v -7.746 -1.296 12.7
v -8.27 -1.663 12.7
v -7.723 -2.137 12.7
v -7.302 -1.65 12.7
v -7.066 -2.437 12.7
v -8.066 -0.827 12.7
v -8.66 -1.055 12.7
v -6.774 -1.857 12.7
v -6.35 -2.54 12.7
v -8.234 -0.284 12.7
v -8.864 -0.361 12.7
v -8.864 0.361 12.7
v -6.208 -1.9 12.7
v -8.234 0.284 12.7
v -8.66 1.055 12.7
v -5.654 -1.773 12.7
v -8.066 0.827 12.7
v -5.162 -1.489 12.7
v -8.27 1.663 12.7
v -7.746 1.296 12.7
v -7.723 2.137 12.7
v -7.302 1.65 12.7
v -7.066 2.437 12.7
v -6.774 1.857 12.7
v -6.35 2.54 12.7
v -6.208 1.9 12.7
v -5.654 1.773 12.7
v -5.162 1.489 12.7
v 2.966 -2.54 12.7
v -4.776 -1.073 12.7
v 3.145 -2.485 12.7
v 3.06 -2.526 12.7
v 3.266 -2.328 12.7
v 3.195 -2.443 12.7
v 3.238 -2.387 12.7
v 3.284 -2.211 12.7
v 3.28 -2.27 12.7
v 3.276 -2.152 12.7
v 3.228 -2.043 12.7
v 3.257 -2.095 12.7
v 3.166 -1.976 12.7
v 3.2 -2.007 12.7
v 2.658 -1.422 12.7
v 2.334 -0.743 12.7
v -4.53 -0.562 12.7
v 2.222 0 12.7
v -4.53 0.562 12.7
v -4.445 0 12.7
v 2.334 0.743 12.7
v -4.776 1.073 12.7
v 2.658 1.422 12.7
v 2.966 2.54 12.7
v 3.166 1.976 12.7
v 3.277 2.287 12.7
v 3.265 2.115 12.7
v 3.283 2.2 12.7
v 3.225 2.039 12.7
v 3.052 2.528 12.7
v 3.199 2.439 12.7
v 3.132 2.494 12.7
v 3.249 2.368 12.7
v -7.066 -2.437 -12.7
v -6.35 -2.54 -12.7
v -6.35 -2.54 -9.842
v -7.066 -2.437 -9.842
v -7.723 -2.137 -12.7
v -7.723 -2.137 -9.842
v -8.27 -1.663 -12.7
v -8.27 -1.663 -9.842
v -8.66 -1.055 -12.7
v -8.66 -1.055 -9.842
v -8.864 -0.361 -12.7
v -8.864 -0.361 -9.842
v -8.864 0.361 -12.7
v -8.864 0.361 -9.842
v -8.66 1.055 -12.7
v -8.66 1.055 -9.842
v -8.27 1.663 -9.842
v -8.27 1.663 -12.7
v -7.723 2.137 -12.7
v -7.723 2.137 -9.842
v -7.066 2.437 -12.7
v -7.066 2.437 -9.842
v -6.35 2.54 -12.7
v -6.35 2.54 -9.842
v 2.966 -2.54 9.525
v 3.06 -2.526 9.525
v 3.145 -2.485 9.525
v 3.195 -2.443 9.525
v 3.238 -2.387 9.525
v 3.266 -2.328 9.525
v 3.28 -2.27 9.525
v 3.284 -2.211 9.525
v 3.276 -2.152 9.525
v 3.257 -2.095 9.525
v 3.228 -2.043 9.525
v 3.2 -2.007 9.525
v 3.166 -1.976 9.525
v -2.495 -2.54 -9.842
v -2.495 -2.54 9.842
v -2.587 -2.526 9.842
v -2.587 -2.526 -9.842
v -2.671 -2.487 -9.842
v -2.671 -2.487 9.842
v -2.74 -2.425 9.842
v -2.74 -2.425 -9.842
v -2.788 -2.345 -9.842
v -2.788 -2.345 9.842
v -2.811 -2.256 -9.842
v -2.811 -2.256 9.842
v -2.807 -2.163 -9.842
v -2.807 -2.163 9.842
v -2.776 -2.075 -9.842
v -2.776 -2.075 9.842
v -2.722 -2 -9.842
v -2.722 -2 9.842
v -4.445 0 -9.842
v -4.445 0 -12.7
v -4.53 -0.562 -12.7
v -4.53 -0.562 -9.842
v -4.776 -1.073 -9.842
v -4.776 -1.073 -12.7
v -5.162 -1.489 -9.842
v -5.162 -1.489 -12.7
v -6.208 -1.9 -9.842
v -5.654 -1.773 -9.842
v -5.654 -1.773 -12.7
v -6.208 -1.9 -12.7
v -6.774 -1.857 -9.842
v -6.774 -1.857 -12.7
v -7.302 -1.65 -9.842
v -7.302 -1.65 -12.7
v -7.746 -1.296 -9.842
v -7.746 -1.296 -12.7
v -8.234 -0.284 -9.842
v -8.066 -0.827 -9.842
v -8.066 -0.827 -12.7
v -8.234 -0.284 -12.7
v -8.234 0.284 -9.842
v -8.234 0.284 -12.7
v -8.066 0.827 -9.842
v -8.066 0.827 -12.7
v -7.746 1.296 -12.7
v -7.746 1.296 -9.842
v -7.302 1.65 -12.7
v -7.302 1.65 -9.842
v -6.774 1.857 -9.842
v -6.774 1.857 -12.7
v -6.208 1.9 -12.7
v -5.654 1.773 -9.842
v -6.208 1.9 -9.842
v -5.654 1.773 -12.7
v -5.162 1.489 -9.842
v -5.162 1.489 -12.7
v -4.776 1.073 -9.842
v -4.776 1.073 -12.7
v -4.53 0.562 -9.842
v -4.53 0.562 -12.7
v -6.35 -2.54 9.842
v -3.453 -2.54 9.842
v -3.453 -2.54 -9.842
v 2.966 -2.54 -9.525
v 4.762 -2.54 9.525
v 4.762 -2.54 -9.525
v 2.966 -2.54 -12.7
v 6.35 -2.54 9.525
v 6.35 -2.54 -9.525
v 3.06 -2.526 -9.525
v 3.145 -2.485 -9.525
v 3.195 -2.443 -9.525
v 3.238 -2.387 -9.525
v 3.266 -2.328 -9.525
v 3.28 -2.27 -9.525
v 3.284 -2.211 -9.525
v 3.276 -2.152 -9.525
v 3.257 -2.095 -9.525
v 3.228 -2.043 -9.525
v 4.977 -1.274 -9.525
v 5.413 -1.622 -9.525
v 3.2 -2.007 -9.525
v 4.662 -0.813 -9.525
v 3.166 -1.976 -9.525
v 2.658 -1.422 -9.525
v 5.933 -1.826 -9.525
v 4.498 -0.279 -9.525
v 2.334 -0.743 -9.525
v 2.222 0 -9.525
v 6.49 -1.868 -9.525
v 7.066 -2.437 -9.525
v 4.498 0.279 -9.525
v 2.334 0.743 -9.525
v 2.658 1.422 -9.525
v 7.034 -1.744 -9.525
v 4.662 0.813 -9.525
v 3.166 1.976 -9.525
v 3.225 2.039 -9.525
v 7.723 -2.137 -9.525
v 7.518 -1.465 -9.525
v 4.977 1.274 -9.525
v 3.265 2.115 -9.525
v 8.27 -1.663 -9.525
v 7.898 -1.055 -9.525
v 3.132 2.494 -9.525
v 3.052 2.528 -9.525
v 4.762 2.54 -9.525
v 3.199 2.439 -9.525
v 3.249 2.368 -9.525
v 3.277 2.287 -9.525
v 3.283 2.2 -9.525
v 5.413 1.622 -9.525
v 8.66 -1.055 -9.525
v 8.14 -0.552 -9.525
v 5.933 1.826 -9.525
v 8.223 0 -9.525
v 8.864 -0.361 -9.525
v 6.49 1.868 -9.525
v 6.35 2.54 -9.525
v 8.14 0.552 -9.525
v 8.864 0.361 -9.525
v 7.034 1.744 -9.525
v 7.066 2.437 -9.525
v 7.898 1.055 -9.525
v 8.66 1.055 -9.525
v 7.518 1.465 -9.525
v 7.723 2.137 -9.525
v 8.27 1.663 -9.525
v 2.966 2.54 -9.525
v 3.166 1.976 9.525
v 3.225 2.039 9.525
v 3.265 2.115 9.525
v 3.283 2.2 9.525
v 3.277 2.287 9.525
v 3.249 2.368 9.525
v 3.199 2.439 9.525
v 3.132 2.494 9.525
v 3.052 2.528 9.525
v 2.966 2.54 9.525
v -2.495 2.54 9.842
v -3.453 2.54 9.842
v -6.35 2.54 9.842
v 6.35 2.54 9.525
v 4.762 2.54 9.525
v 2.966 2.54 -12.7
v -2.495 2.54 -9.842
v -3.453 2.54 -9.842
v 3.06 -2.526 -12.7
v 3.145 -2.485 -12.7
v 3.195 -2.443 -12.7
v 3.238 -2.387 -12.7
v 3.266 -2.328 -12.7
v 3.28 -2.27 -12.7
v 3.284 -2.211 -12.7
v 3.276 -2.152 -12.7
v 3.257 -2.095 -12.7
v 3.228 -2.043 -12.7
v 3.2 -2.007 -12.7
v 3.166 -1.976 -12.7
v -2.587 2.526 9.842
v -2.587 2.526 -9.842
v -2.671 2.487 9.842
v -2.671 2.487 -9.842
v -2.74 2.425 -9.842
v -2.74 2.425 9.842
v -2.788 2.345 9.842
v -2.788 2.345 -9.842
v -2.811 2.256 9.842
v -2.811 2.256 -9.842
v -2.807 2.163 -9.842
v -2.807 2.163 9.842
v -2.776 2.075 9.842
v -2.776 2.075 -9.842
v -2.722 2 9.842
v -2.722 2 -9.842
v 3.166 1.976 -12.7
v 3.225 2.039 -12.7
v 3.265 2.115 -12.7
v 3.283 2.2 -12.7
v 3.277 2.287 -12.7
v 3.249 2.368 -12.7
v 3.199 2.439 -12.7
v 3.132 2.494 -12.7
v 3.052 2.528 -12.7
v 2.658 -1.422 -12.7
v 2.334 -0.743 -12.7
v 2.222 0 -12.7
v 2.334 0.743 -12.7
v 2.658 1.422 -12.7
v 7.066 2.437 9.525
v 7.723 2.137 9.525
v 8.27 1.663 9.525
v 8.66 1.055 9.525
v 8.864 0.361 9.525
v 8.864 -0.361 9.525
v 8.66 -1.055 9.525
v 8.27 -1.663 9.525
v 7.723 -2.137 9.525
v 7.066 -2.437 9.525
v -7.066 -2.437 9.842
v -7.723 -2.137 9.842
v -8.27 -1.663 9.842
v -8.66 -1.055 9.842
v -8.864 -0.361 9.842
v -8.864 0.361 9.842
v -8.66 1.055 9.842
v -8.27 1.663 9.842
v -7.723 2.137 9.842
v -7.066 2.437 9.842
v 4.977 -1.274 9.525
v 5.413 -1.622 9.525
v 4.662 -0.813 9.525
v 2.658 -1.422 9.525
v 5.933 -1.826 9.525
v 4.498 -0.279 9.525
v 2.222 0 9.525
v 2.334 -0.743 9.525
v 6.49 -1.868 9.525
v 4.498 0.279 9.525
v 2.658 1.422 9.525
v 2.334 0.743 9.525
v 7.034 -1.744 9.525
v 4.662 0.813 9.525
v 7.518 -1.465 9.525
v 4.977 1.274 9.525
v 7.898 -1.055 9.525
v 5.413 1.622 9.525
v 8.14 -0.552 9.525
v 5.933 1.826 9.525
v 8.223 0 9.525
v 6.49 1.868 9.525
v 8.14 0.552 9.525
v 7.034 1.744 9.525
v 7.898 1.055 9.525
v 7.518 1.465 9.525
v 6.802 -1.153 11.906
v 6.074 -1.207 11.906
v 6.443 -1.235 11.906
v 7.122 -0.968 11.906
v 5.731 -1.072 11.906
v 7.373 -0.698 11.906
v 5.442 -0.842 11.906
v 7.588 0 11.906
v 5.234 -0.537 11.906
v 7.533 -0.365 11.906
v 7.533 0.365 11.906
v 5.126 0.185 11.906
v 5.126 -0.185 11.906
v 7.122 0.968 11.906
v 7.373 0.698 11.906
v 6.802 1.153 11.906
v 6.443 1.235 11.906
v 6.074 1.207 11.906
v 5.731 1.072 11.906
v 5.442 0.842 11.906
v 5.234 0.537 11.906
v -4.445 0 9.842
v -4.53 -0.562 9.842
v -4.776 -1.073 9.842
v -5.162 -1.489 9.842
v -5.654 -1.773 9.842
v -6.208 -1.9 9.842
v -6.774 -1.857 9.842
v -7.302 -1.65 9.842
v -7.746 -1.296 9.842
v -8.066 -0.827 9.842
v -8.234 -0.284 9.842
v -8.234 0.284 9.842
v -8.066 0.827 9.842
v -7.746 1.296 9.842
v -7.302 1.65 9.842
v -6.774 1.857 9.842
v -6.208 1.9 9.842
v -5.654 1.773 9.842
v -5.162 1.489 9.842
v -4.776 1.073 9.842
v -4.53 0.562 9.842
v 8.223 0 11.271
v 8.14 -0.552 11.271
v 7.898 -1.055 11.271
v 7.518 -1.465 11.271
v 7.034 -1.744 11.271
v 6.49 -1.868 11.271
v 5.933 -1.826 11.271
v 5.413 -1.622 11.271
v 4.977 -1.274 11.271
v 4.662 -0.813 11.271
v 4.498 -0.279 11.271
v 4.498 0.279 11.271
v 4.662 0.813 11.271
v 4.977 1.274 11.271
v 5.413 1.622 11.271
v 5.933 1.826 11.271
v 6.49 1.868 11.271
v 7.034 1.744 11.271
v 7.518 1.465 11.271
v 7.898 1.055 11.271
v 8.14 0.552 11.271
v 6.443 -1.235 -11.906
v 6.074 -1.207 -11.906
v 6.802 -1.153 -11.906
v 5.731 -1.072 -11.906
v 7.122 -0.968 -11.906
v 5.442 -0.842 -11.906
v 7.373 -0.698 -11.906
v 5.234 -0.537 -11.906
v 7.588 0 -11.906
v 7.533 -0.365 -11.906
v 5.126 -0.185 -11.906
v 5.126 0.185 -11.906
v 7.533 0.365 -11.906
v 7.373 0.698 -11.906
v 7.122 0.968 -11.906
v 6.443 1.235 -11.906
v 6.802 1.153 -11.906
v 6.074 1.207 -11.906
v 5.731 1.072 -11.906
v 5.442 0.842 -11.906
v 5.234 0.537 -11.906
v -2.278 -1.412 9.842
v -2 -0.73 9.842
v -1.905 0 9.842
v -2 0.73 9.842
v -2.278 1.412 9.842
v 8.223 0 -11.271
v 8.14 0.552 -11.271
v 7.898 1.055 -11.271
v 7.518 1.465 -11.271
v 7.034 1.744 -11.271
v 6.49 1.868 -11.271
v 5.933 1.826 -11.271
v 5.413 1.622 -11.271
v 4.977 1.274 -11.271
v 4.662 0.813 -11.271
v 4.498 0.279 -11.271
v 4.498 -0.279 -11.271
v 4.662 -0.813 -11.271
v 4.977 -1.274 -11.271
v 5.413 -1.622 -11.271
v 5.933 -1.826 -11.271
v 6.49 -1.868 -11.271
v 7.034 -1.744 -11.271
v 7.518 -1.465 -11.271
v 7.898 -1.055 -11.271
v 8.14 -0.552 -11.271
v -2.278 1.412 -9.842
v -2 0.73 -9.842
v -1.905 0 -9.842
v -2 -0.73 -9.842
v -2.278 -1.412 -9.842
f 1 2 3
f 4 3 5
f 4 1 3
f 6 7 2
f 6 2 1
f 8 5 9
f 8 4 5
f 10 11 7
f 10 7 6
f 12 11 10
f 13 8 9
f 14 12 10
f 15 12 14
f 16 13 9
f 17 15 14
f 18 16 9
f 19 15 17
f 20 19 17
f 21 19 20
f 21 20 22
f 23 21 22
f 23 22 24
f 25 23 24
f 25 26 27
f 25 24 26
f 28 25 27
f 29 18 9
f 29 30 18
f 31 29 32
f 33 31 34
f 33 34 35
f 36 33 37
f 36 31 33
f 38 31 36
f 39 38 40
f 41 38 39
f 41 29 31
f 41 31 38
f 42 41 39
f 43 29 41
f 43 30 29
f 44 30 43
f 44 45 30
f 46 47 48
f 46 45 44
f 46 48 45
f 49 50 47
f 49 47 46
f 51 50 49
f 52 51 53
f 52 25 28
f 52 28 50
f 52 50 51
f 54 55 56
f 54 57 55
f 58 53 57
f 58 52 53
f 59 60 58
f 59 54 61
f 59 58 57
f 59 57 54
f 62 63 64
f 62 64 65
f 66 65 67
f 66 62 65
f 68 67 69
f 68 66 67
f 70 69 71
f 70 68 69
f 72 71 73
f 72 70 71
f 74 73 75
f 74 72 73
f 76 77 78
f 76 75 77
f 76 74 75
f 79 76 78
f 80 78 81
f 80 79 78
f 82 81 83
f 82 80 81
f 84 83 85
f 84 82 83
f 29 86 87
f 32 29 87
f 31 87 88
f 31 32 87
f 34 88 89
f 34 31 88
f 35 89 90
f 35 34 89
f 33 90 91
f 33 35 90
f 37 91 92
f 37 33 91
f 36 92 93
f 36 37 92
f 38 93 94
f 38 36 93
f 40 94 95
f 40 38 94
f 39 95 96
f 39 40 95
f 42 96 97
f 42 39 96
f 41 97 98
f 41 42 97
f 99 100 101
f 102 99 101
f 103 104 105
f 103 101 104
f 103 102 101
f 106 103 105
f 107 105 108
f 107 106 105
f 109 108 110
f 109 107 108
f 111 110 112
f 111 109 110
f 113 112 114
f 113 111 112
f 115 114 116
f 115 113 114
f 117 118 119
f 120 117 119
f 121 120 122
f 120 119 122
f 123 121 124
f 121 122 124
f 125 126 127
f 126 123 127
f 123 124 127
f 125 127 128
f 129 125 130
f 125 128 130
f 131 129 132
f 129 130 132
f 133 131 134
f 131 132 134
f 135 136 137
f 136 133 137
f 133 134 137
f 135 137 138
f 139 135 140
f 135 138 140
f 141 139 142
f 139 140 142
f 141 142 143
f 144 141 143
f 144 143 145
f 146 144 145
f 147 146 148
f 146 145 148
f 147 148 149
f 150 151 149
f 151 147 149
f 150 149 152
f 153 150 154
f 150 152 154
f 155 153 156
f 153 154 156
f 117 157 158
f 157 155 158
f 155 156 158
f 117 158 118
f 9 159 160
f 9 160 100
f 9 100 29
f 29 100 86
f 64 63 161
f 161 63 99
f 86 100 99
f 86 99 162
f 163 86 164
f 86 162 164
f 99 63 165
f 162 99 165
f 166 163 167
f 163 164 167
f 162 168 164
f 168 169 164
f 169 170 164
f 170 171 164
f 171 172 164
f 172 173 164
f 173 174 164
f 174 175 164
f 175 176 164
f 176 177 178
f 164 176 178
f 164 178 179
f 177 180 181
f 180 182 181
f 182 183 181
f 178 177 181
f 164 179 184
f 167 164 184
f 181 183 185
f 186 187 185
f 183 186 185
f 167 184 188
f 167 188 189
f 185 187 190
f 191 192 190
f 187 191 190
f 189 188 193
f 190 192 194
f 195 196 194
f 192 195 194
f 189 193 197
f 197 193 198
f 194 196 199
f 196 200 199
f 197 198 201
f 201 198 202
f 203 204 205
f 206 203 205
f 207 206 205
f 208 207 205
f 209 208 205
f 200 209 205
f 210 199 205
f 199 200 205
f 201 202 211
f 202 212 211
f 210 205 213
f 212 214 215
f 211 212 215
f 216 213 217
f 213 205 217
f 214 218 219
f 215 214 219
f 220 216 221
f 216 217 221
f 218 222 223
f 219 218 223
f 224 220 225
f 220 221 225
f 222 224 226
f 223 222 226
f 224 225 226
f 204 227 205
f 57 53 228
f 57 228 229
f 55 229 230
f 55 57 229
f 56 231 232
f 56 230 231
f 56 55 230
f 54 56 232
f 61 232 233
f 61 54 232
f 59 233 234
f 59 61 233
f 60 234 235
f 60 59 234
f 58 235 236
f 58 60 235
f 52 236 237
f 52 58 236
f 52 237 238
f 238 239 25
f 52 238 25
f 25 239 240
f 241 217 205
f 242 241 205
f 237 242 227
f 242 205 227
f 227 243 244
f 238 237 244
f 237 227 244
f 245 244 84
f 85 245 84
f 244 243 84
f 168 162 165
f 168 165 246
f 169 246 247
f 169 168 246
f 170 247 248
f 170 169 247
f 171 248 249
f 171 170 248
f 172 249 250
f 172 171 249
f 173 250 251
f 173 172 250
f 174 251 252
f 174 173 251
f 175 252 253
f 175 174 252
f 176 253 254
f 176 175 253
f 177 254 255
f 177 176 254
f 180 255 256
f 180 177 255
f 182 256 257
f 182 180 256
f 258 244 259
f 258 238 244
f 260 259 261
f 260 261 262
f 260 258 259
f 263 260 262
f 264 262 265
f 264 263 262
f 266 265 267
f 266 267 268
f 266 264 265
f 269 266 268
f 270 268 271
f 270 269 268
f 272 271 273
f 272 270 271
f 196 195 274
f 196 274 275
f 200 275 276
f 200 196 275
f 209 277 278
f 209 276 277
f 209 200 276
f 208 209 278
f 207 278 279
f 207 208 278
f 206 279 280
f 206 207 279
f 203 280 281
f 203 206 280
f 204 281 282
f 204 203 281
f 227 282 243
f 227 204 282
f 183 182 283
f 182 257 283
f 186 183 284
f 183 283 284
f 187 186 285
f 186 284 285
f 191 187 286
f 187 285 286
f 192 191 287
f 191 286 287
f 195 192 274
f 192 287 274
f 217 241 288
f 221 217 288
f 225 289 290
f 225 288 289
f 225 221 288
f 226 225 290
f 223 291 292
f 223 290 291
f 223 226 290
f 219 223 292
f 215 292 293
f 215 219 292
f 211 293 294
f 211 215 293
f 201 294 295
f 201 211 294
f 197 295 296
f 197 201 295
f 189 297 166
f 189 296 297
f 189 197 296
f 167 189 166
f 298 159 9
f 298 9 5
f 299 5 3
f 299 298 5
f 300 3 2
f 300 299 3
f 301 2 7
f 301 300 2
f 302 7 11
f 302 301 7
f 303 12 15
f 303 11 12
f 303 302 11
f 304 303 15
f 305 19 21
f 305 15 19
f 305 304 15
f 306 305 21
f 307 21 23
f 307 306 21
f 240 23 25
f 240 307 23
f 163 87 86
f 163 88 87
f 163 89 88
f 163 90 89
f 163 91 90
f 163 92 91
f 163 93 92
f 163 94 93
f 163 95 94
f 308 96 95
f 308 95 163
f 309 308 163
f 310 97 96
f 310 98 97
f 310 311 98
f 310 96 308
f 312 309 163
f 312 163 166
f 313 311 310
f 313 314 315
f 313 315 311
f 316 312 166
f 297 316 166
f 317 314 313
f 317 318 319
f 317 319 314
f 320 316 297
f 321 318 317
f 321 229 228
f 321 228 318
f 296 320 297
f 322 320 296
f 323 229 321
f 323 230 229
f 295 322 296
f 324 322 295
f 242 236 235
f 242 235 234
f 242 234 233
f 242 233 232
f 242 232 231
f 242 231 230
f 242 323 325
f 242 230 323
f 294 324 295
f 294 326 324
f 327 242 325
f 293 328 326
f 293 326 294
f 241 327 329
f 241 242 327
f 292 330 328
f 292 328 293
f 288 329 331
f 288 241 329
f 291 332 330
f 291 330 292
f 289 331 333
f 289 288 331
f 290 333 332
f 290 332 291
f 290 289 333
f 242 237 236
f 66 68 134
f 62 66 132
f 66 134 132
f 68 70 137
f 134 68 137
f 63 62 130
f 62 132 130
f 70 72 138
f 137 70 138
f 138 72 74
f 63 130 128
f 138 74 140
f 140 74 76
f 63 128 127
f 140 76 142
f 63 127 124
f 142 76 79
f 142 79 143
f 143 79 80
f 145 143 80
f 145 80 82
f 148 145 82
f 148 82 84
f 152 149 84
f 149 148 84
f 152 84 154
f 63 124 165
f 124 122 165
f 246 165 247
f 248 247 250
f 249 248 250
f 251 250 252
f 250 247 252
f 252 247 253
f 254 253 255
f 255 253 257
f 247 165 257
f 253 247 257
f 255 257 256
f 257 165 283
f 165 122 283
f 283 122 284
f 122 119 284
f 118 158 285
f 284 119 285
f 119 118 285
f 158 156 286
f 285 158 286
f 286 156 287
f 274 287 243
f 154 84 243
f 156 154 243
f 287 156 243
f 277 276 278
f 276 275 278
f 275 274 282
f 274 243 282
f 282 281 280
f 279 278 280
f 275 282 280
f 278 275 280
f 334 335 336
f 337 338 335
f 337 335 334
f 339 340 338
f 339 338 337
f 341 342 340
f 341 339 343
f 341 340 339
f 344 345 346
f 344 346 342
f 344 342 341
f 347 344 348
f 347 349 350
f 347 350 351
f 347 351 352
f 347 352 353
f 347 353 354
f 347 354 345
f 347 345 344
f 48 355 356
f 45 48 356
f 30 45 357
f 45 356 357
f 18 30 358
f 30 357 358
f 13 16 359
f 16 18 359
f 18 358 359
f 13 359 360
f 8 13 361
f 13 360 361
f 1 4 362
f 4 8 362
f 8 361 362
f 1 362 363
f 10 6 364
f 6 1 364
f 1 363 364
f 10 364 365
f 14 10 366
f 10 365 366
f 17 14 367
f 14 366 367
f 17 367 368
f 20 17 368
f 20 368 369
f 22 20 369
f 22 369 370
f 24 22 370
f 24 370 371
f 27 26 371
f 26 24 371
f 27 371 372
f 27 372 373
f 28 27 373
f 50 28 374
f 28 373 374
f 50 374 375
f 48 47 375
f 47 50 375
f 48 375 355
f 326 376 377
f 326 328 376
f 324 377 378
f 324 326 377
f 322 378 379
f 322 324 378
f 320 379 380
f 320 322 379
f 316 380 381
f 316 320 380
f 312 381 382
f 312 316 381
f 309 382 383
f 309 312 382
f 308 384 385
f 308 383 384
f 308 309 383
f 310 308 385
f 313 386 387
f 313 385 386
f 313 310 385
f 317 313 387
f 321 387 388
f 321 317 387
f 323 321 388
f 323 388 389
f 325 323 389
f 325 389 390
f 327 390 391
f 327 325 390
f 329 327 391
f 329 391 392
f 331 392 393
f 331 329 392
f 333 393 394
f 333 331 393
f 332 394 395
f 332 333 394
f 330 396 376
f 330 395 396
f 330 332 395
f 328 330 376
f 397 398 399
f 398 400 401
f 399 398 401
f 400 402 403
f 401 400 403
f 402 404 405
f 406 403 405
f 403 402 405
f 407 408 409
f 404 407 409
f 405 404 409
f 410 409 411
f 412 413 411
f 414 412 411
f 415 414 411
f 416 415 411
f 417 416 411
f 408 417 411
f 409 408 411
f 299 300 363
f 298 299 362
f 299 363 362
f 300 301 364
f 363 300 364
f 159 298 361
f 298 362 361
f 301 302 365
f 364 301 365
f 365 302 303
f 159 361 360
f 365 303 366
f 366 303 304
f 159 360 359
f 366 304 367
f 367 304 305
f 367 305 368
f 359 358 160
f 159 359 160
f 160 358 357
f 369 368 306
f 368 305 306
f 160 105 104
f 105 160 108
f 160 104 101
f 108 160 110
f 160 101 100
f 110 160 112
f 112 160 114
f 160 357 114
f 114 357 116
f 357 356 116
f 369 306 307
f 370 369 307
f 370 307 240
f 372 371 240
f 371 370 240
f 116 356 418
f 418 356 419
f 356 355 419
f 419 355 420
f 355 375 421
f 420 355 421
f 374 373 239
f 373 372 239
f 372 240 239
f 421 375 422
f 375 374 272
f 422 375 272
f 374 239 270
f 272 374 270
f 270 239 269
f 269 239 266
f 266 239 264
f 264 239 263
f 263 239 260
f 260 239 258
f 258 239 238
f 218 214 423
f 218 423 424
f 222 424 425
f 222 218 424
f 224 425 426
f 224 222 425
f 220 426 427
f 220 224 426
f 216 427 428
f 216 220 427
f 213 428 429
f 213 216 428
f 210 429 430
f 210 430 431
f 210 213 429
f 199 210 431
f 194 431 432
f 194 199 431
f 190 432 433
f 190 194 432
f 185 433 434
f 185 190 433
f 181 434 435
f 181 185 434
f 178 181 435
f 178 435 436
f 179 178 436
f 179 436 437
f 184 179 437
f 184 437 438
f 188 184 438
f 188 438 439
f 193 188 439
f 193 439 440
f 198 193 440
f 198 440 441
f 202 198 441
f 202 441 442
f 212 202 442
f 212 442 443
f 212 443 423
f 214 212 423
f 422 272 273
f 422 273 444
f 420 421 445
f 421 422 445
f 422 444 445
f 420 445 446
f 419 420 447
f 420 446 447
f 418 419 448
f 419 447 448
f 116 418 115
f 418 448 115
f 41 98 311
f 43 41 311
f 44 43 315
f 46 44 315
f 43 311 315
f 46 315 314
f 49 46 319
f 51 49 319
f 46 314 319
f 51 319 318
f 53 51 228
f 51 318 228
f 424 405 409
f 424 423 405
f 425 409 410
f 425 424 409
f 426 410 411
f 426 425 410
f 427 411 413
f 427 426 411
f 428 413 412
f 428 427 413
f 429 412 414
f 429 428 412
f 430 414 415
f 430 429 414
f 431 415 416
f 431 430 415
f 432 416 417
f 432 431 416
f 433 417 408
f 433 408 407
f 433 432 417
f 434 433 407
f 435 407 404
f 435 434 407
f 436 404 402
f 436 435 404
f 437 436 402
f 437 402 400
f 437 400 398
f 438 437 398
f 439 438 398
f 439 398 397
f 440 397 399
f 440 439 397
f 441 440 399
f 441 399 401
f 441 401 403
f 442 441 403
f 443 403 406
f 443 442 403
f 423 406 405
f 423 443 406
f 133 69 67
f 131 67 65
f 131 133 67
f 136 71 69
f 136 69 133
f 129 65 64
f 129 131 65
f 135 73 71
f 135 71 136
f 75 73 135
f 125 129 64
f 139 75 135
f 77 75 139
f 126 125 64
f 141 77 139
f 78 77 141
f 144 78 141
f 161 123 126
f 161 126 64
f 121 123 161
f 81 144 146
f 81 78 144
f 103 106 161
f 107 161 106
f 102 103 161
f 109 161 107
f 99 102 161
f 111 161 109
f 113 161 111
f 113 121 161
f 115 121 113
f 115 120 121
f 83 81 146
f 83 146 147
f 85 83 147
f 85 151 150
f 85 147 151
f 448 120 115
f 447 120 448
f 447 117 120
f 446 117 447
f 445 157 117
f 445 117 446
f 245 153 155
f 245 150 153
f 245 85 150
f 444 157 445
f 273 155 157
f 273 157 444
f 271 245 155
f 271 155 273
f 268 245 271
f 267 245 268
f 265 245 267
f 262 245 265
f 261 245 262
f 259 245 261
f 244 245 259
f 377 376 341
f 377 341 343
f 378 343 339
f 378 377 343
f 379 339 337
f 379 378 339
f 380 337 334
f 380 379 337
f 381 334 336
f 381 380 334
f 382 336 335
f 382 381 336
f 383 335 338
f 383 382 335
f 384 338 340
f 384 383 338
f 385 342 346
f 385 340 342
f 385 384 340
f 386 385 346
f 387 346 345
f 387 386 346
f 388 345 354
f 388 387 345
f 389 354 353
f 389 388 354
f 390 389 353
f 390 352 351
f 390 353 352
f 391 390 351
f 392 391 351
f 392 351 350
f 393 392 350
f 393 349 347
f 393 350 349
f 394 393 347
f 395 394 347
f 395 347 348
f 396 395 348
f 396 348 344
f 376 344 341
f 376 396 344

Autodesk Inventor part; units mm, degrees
ref_plane "YZ Plane" through (0, 0, 0) normal (1, 0, 0) x (0, 1, 0)
ref_plane "XZ Plane" through (0, 0, 0) normal (0, 1, 0) x (-1, 0, 0)
ref_plane "XY Plane" through (0, 0, 0) normal (0, 0, 1) x (1, 0, 0)
sketch "Sketch1" plane through (0, 0, 0) normal (0, 0, 1) x (1, 0, 0)
  circle A0 centre (-6.35, 0) radius 1.905
  circle A1 centre (6.35, 0) radius 1.87325
  arc A2 (-6.35, 2.54) -> (-6.35, -2.54) centre (-6.35, 0) ccw
  line L0 (-6.35, 2.54) -> (4.7625, 2.54)
  line L1 (0, 3.556) -> (0, -3.556) construction
  line L2 (-12.446, 0) -> (12.446, 0) construction
  line L3 (-6.35, -2.54) -> (4.7625, -2.54)
  arc A3 (-3.453414, -2.54) -> (-3.453414, 2.54) centre (-4.7625, 0) ccw
  arc A4 (6.35, -2.54) -> (6.35, 2.54) centre (6.35, 0) ccw
  line L4 (4.7625, 2.54) -> (6.35, 2.54)
  line L5 (4.7625, -2.54) -> (6.35, -2.54)
  arc A5 (4.7625, 2.54) -> (4.7625, -2.54) centre (4.7625, 0) ccw
  dimension "d2" = 3.81
  dimension "d3" = 3.7465
  dimension "d5" = 5.08
  dimension "d6" = 12.7
  dimension "d16" = 1.5875
  dimension "d17" = 2.8575
  dimension "d18" = 1.5875
sketch "Sketch1 outline for Extrusion1" plane through (0, 0, 0) normal (0, 0, 1) x (1, 0, 0)
  arc A0 (4.7625, -2.54) -> (4.7625, 2.54) centre (4.7625, 0) cw
  line L0 (4.7625, 2.54) -> (-6.35, 2.54)
  arc A1 (-6.35, 2.54) -> (-6.35, -2.54) centre (-6.35, 0) ccw
  line L1 (-6.35, -2.54) -> (4.7625, -2.54)
  circle A2 centre (-6.35, 0) radius 1.905
extrude "Extrusion1" add sketch "Sketch1 outline for Extrusion1" along normal mid plane 25.4
sketch "Sketch1 outline for Extrusion2" plane through (0, 0, 0) normal (0, 0, 1) x (1, 0, 0)
  arc A0 (4.7625, 2.54) -> (4.7625, -2.54) centre (4.7625, 0) ccw
  line L0 (6.35, 2.54) -> (4.7625, 2.54)
  line L1 (4.7625, -2.54) -> (6.35, -2.54)
  arc A1 (6.35, -2.54) -> (6.35, 2.54) centre (6.35, 0) ccw
  circle A2 centre (6.35, 0) radius 1.87325
extrude "Extrusion2" add sketch "Sketch1 outline for Extrusion2" along normal mid plane 19.05
sketch "Sketch1 outline for Extrusion3" plane through (0, 0, 0) normal (0, 0, 1) x (1, 0, 0)
  line L0 (-3.453414, 2.54) -> (-6.35, 2.54)
  arc A0 (-3.453414, -2.54) -> (-3.453414, 2.54) centre (-4.7625, 0) ccw
  arc A1 (-6.35, 2.54) -> (-6.35, -2.54) centre (-6.35, 0) ccw
  line L1 (-6.35, -2.54) -> (-3.453414, -2.54)
  circle A2 centre (-6.35, 0) radius 1.905
extrude "Extrusion3" cut sketch "Sketch1 outline for Extrusion3" along normal mid plane 19.685
sketch "Sketch1 outline for Extrusion4" plane through (0, 0, 0) normal (0, 0, 1) x (1, 0, 0)
  circle A0 centre (6.35, 0) radius 1.87325
extrude "Extrusion4" add sketch "Sketch1 outline for Extrusion4" along normal mid plane 23.8125
chamfer "Chamfer1" distance 0.635 angle 45 2 edges at (4.4768, 0, 11.9062) (4.4768, 0, -11.9062)
fillet "Fillet1" radius 0.3175 6 edges at (-3.4534, 2.54, 0) (-3.4534, -2.54, 0) (4.7625, 2.54, 11.1125) (4.7625, 2.54, -11.1125) (4.7625, -2.54, 11.1125) (4.7625, -2.54, -11.1125)
equation "\"d18\" = d16"
properties part number "TrackDisplayStrapSegment"
